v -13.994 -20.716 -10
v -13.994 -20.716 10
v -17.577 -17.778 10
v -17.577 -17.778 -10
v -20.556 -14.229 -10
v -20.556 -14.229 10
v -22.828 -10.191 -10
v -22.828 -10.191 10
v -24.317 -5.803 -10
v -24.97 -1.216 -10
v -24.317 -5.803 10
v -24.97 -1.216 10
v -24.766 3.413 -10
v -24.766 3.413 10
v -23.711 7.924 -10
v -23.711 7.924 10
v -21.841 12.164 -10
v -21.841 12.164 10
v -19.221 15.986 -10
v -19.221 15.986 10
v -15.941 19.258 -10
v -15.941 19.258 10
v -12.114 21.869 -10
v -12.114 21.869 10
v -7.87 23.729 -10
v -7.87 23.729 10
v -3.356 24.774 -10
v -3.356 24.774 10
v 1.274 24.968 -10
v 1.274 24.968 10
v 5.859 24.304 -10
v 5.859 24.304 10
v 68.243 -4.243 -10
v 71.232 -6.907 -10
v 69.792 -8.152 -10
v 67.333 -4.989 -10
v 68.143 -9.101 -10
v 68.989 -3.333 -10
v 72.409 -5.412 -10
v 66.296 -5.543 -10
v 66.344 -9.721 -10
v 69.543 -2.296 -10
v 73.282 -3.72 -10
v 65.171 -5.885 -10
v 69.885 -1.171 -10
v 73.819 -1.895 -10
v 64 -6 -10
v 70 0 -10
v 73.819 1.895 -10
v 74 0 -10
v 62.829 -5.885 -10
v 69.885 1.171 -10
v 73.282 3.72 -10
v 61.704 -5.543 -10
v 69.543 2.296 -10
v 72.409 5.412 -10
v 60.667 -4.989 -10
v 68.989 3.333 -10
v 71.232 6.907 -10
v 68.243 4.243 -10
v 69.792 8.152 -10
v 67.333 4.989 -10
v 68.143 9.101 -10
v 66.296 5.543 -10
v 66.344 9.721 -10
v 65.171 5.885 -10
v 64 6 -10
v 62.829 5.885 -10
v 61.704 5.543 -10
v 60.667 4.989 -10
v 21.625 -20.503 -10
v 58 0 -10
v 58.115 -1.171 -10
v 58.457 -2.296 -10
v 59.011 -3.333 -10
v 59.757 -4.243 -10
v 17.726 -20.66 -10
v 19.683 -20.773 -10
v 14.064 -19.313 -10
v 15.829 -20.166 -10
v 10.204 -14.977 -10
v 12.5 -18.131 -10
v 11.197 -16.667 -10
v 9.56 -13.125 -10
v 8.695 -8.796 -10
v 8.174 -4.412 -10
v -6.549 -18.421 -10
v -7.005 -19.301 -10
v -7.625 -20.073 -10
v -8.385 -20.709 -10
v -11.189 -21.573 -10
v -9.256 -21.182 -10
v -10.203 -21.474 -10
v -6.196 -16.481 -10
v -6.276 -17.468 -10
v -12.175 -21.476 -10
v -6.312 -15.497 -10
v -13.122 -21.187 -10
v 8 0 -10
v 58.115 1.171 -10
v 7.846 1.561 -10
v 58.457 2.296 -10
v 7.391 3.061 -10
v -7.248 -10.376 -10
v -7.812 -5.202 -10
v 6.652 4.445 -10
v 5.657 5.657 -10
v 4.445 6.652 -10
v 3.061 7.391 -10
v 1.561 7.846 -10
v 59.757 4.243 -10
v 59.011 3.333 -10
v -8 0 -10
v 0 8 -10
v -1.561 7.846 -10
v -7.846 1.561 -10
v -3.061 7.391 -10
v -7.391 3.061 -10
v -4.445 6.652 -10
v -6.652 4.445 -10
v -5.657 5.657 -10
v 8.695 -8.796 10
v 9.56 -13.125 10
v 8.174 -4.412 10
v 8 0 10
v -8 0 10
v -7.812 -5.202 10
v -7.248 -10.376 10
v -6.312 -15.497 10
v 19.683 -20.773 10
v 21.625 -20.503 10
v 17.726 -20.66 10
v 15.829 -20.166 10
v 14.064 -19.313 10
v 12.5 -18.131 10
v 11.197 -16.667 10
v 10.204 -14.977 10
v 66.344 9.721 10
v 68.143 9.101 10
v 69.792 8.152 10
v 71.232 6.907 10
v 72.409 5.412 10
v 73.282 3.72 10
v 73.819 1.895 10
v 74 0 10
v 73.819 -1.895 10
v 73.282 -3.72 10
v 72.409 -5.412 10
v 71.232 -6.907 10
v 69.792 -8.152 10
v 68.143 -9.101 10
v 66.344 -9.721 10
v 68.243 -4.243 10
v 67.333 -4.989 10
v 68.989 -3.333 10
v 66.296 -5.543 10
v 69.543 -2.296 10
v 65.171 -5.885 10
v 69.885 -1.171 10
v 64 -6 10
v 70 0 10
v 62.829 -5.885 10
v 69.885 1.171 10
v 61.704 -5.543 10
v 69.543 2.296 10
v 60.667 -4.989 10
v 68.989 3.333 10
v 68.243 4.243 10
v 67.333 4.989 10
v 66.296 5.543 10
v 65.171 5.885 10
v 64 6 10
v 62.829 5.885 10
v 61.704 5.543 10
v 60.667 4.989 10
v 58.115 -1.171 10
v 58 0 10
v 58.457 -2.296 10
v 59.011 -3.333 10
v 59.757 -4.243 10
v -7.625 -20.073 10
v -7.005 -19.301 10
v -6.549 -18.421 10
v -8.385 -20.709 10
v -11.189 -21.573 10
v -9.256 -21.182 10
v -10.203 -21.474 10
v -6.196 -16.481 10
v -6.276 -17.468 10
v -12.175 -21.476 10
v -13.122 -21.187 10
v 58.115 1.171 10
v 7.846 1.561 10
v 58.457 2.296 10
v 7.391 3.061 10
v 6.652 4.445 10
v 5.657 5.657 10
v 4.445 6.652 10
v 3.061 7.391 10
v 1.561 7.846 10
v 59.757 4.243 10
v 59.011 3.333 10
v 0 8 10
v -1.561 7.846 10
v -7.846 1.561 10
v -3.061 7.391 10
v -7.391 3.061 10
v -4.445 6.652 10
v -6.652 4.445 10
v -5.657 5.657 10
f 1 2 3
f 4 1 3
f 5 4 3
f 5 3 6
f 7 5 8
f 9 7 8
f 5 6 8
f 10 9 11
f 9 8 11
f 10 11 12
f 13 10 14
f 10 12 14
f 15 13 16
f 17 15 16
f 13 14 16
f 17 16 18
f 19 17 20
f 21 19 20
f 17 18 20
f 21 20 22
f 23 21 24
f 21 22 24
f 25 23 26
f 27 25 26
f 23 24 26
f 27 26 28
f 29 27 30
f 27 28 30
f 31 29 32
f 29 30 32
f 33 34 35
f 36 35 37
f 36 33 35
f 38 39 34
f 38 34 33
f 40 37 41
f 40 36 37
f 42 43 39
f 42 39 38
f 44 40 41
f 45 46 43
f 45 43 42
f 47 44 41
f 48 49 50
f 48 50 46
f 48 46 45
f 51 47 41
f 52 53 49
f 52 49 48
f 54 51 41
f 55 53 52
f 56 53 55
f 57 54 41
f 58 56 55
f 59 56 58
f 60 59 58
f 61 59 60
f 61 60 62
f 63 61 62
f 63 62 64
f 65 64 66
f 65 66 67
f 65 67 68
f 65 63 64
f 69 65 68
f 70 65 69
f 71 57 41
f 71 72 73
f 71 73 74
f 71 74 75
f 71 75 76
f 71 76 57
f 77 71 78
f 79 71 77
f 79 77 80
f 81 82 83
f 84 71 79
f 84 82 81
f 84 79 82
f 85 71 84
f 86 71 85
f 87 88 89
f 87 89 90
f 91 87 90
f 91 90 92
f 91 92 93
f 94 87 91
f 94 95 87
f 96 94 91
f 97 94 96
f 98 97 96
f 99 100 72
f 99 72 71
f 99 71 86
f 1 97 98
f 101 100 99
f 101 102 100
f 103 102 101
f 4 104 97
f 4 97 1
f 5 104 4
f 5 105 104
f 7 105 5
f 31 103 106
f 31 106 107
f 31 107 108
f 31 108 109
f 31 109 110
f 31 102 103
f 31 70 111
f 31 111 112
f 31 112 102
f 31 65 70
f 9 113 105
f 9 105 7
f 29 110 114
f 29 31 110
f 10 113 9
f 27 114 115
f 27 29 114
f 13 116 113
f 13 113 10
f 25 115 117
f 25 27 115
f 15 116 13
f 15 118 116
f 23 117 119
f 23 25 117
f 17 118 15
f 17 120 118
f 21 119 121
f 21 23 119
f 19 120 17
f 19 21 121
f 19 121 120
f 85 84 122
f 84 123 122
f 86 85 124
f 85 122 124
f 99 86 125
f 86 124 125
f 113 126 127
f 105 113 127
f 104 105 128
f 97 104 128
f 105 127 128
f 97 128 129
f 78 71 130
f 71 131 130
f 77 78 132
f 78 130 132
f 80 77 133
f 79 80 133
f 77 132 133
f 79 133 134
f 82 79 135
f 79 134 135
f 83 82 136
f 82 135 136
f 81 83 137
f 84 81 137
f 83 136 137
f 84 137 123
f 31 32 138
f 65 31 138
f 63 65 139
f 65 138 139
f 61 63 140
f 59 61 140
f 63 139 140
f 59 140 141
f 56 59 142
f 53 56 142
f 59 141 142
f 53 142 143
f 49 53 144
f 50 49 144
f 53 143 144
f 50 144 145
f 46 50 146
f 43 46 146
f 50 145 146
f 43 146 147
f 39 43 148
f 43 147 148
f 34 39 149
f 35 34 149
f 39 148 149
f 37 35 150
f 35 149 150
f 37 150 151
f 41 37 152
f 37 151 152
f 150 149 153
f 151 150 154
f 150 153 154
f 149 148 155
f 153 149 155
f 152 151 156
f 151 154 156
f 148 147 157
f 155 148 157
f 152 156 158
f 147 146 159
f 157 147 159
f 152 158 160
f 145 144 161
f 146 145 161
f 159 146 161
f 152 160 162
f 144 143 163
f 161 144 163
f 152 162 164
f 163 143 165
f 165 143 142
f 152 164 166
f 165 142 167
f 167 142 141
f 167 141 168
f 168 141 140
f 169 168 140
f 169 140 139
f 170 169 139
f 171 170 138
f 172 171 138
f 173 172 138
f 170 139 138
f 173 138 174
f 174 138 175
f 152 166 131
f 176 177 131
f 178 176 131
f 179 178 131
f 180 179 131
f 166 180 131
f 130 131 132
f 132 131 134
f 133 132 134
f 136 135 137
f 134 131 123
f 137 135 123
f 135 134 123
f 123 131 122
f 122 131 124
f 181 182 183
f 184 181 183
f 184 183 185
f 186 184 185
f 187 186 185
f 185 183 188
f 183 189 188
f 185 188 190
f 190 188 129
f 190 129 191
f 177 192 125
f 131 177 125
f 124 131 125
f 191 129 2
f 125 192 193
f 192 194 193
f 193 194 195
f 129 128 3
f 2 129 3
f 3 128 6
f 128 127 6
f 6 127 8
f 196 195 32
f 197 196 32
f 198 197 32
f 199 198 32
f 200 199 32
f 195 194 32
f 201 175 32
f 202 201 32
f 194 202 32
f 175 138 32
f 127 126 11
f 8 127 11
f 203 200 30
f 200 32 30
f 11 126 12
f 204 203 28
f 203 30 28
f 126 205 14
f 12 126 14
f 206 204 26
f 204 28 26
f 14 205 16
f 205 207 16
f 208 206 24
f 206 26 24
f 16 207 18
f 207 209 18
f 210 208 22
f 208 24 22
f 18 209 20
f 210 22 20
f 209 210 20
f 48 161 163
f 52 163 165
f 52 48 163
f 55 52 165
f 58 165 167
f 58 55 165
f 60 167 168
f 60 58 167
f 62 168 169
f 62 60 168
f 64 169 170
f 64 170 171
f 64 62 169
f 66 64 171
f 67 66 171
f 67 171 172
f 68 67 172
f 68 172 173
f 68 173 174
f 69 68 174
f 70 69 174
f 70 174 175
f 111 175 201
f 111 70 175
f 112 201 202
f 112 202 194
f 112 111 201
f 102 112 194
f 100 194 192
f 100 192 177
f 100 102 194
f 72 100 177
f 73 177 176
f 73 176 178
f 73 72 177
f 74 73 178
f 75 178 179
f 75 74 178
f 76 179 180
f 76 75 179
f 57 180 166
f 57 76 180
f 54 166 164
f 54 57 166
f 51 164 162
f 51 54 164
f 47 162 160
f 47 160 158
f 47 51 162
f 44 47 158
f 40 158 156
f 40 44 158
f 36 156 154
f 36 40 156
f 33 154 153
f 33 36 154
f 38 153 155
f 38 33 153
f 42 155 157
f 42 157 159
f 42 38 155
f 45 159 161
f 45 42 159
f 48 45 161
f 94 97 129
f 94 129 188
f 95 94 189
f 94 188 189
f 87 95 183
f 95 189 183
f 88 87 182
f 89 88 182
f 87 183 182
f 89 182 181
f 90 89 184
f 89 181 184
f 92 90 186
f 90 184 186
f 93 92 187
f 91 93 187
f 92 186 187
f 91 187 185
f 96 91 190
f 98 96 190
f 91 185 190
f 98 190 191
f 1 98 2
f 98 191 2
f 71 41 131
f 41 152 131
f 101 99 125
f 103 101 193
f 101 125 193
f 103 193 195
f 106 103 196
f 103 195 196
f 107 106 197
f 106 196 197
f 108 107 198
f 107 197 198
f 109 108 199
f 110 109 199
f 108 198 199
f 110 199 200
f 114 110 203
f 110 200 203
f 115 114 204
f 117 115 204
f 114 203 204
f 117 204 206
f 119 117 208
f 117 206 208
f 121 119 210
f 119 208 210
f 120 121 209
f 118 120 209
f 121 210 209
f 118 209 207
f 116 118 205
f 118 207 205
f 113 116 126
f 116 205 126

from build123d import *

# Parameters (mm, degrees)
SKETCH1_R           = 6
BOSS_EXTRUDE1_DEPTH = 10


with BuildPart() as part:
    # Sketch1 → Boss-Extrude1 (new, symmetric)
    with BuildSketch(Plane.XY):
        with BuildLine():
            Line((5.859375, 24.30365661), (66.34375, 9.721462644))
            ThreePointArc((66.34375, 9.721462644), (74, 0), (66.34375, -9.721462644))
            Line((66.34375, -9.721462644), (21.625021838, -20.502712644))
            ThreePointArc((21.625021838, -20.502712644), (14.064441198, -19.312643677), (9.559809194, -13.125))
            ThreePointArc((9.559809194, -13.125), (8.391319539, -6.608680461), (8, 0))
            ThreePointArc((8, 0), (0, 8), (-8, 0))
            ThreePointArc((-8, 0), (-7.576881743, -7.794228634), (-6.3125, -15.496849478))
            ThreePointArc((-6.3125, -15.496849478), (-8.385268542, -20.708675871), (-13.994140625, -20.716274476))
            ThreePointArc((-13.994140625, -20.716274476), (-22.874486916, 10.08750952), (5.859375, 24.30365661))
        make_face()
        with Locations((64, 0)):
            Circle(SKETCH1_R, mode=Mode.SUBTRACT)
    extrude(amount=BOSS_EXTRUDE1_DEPTH, both=True)


solid = part.part
